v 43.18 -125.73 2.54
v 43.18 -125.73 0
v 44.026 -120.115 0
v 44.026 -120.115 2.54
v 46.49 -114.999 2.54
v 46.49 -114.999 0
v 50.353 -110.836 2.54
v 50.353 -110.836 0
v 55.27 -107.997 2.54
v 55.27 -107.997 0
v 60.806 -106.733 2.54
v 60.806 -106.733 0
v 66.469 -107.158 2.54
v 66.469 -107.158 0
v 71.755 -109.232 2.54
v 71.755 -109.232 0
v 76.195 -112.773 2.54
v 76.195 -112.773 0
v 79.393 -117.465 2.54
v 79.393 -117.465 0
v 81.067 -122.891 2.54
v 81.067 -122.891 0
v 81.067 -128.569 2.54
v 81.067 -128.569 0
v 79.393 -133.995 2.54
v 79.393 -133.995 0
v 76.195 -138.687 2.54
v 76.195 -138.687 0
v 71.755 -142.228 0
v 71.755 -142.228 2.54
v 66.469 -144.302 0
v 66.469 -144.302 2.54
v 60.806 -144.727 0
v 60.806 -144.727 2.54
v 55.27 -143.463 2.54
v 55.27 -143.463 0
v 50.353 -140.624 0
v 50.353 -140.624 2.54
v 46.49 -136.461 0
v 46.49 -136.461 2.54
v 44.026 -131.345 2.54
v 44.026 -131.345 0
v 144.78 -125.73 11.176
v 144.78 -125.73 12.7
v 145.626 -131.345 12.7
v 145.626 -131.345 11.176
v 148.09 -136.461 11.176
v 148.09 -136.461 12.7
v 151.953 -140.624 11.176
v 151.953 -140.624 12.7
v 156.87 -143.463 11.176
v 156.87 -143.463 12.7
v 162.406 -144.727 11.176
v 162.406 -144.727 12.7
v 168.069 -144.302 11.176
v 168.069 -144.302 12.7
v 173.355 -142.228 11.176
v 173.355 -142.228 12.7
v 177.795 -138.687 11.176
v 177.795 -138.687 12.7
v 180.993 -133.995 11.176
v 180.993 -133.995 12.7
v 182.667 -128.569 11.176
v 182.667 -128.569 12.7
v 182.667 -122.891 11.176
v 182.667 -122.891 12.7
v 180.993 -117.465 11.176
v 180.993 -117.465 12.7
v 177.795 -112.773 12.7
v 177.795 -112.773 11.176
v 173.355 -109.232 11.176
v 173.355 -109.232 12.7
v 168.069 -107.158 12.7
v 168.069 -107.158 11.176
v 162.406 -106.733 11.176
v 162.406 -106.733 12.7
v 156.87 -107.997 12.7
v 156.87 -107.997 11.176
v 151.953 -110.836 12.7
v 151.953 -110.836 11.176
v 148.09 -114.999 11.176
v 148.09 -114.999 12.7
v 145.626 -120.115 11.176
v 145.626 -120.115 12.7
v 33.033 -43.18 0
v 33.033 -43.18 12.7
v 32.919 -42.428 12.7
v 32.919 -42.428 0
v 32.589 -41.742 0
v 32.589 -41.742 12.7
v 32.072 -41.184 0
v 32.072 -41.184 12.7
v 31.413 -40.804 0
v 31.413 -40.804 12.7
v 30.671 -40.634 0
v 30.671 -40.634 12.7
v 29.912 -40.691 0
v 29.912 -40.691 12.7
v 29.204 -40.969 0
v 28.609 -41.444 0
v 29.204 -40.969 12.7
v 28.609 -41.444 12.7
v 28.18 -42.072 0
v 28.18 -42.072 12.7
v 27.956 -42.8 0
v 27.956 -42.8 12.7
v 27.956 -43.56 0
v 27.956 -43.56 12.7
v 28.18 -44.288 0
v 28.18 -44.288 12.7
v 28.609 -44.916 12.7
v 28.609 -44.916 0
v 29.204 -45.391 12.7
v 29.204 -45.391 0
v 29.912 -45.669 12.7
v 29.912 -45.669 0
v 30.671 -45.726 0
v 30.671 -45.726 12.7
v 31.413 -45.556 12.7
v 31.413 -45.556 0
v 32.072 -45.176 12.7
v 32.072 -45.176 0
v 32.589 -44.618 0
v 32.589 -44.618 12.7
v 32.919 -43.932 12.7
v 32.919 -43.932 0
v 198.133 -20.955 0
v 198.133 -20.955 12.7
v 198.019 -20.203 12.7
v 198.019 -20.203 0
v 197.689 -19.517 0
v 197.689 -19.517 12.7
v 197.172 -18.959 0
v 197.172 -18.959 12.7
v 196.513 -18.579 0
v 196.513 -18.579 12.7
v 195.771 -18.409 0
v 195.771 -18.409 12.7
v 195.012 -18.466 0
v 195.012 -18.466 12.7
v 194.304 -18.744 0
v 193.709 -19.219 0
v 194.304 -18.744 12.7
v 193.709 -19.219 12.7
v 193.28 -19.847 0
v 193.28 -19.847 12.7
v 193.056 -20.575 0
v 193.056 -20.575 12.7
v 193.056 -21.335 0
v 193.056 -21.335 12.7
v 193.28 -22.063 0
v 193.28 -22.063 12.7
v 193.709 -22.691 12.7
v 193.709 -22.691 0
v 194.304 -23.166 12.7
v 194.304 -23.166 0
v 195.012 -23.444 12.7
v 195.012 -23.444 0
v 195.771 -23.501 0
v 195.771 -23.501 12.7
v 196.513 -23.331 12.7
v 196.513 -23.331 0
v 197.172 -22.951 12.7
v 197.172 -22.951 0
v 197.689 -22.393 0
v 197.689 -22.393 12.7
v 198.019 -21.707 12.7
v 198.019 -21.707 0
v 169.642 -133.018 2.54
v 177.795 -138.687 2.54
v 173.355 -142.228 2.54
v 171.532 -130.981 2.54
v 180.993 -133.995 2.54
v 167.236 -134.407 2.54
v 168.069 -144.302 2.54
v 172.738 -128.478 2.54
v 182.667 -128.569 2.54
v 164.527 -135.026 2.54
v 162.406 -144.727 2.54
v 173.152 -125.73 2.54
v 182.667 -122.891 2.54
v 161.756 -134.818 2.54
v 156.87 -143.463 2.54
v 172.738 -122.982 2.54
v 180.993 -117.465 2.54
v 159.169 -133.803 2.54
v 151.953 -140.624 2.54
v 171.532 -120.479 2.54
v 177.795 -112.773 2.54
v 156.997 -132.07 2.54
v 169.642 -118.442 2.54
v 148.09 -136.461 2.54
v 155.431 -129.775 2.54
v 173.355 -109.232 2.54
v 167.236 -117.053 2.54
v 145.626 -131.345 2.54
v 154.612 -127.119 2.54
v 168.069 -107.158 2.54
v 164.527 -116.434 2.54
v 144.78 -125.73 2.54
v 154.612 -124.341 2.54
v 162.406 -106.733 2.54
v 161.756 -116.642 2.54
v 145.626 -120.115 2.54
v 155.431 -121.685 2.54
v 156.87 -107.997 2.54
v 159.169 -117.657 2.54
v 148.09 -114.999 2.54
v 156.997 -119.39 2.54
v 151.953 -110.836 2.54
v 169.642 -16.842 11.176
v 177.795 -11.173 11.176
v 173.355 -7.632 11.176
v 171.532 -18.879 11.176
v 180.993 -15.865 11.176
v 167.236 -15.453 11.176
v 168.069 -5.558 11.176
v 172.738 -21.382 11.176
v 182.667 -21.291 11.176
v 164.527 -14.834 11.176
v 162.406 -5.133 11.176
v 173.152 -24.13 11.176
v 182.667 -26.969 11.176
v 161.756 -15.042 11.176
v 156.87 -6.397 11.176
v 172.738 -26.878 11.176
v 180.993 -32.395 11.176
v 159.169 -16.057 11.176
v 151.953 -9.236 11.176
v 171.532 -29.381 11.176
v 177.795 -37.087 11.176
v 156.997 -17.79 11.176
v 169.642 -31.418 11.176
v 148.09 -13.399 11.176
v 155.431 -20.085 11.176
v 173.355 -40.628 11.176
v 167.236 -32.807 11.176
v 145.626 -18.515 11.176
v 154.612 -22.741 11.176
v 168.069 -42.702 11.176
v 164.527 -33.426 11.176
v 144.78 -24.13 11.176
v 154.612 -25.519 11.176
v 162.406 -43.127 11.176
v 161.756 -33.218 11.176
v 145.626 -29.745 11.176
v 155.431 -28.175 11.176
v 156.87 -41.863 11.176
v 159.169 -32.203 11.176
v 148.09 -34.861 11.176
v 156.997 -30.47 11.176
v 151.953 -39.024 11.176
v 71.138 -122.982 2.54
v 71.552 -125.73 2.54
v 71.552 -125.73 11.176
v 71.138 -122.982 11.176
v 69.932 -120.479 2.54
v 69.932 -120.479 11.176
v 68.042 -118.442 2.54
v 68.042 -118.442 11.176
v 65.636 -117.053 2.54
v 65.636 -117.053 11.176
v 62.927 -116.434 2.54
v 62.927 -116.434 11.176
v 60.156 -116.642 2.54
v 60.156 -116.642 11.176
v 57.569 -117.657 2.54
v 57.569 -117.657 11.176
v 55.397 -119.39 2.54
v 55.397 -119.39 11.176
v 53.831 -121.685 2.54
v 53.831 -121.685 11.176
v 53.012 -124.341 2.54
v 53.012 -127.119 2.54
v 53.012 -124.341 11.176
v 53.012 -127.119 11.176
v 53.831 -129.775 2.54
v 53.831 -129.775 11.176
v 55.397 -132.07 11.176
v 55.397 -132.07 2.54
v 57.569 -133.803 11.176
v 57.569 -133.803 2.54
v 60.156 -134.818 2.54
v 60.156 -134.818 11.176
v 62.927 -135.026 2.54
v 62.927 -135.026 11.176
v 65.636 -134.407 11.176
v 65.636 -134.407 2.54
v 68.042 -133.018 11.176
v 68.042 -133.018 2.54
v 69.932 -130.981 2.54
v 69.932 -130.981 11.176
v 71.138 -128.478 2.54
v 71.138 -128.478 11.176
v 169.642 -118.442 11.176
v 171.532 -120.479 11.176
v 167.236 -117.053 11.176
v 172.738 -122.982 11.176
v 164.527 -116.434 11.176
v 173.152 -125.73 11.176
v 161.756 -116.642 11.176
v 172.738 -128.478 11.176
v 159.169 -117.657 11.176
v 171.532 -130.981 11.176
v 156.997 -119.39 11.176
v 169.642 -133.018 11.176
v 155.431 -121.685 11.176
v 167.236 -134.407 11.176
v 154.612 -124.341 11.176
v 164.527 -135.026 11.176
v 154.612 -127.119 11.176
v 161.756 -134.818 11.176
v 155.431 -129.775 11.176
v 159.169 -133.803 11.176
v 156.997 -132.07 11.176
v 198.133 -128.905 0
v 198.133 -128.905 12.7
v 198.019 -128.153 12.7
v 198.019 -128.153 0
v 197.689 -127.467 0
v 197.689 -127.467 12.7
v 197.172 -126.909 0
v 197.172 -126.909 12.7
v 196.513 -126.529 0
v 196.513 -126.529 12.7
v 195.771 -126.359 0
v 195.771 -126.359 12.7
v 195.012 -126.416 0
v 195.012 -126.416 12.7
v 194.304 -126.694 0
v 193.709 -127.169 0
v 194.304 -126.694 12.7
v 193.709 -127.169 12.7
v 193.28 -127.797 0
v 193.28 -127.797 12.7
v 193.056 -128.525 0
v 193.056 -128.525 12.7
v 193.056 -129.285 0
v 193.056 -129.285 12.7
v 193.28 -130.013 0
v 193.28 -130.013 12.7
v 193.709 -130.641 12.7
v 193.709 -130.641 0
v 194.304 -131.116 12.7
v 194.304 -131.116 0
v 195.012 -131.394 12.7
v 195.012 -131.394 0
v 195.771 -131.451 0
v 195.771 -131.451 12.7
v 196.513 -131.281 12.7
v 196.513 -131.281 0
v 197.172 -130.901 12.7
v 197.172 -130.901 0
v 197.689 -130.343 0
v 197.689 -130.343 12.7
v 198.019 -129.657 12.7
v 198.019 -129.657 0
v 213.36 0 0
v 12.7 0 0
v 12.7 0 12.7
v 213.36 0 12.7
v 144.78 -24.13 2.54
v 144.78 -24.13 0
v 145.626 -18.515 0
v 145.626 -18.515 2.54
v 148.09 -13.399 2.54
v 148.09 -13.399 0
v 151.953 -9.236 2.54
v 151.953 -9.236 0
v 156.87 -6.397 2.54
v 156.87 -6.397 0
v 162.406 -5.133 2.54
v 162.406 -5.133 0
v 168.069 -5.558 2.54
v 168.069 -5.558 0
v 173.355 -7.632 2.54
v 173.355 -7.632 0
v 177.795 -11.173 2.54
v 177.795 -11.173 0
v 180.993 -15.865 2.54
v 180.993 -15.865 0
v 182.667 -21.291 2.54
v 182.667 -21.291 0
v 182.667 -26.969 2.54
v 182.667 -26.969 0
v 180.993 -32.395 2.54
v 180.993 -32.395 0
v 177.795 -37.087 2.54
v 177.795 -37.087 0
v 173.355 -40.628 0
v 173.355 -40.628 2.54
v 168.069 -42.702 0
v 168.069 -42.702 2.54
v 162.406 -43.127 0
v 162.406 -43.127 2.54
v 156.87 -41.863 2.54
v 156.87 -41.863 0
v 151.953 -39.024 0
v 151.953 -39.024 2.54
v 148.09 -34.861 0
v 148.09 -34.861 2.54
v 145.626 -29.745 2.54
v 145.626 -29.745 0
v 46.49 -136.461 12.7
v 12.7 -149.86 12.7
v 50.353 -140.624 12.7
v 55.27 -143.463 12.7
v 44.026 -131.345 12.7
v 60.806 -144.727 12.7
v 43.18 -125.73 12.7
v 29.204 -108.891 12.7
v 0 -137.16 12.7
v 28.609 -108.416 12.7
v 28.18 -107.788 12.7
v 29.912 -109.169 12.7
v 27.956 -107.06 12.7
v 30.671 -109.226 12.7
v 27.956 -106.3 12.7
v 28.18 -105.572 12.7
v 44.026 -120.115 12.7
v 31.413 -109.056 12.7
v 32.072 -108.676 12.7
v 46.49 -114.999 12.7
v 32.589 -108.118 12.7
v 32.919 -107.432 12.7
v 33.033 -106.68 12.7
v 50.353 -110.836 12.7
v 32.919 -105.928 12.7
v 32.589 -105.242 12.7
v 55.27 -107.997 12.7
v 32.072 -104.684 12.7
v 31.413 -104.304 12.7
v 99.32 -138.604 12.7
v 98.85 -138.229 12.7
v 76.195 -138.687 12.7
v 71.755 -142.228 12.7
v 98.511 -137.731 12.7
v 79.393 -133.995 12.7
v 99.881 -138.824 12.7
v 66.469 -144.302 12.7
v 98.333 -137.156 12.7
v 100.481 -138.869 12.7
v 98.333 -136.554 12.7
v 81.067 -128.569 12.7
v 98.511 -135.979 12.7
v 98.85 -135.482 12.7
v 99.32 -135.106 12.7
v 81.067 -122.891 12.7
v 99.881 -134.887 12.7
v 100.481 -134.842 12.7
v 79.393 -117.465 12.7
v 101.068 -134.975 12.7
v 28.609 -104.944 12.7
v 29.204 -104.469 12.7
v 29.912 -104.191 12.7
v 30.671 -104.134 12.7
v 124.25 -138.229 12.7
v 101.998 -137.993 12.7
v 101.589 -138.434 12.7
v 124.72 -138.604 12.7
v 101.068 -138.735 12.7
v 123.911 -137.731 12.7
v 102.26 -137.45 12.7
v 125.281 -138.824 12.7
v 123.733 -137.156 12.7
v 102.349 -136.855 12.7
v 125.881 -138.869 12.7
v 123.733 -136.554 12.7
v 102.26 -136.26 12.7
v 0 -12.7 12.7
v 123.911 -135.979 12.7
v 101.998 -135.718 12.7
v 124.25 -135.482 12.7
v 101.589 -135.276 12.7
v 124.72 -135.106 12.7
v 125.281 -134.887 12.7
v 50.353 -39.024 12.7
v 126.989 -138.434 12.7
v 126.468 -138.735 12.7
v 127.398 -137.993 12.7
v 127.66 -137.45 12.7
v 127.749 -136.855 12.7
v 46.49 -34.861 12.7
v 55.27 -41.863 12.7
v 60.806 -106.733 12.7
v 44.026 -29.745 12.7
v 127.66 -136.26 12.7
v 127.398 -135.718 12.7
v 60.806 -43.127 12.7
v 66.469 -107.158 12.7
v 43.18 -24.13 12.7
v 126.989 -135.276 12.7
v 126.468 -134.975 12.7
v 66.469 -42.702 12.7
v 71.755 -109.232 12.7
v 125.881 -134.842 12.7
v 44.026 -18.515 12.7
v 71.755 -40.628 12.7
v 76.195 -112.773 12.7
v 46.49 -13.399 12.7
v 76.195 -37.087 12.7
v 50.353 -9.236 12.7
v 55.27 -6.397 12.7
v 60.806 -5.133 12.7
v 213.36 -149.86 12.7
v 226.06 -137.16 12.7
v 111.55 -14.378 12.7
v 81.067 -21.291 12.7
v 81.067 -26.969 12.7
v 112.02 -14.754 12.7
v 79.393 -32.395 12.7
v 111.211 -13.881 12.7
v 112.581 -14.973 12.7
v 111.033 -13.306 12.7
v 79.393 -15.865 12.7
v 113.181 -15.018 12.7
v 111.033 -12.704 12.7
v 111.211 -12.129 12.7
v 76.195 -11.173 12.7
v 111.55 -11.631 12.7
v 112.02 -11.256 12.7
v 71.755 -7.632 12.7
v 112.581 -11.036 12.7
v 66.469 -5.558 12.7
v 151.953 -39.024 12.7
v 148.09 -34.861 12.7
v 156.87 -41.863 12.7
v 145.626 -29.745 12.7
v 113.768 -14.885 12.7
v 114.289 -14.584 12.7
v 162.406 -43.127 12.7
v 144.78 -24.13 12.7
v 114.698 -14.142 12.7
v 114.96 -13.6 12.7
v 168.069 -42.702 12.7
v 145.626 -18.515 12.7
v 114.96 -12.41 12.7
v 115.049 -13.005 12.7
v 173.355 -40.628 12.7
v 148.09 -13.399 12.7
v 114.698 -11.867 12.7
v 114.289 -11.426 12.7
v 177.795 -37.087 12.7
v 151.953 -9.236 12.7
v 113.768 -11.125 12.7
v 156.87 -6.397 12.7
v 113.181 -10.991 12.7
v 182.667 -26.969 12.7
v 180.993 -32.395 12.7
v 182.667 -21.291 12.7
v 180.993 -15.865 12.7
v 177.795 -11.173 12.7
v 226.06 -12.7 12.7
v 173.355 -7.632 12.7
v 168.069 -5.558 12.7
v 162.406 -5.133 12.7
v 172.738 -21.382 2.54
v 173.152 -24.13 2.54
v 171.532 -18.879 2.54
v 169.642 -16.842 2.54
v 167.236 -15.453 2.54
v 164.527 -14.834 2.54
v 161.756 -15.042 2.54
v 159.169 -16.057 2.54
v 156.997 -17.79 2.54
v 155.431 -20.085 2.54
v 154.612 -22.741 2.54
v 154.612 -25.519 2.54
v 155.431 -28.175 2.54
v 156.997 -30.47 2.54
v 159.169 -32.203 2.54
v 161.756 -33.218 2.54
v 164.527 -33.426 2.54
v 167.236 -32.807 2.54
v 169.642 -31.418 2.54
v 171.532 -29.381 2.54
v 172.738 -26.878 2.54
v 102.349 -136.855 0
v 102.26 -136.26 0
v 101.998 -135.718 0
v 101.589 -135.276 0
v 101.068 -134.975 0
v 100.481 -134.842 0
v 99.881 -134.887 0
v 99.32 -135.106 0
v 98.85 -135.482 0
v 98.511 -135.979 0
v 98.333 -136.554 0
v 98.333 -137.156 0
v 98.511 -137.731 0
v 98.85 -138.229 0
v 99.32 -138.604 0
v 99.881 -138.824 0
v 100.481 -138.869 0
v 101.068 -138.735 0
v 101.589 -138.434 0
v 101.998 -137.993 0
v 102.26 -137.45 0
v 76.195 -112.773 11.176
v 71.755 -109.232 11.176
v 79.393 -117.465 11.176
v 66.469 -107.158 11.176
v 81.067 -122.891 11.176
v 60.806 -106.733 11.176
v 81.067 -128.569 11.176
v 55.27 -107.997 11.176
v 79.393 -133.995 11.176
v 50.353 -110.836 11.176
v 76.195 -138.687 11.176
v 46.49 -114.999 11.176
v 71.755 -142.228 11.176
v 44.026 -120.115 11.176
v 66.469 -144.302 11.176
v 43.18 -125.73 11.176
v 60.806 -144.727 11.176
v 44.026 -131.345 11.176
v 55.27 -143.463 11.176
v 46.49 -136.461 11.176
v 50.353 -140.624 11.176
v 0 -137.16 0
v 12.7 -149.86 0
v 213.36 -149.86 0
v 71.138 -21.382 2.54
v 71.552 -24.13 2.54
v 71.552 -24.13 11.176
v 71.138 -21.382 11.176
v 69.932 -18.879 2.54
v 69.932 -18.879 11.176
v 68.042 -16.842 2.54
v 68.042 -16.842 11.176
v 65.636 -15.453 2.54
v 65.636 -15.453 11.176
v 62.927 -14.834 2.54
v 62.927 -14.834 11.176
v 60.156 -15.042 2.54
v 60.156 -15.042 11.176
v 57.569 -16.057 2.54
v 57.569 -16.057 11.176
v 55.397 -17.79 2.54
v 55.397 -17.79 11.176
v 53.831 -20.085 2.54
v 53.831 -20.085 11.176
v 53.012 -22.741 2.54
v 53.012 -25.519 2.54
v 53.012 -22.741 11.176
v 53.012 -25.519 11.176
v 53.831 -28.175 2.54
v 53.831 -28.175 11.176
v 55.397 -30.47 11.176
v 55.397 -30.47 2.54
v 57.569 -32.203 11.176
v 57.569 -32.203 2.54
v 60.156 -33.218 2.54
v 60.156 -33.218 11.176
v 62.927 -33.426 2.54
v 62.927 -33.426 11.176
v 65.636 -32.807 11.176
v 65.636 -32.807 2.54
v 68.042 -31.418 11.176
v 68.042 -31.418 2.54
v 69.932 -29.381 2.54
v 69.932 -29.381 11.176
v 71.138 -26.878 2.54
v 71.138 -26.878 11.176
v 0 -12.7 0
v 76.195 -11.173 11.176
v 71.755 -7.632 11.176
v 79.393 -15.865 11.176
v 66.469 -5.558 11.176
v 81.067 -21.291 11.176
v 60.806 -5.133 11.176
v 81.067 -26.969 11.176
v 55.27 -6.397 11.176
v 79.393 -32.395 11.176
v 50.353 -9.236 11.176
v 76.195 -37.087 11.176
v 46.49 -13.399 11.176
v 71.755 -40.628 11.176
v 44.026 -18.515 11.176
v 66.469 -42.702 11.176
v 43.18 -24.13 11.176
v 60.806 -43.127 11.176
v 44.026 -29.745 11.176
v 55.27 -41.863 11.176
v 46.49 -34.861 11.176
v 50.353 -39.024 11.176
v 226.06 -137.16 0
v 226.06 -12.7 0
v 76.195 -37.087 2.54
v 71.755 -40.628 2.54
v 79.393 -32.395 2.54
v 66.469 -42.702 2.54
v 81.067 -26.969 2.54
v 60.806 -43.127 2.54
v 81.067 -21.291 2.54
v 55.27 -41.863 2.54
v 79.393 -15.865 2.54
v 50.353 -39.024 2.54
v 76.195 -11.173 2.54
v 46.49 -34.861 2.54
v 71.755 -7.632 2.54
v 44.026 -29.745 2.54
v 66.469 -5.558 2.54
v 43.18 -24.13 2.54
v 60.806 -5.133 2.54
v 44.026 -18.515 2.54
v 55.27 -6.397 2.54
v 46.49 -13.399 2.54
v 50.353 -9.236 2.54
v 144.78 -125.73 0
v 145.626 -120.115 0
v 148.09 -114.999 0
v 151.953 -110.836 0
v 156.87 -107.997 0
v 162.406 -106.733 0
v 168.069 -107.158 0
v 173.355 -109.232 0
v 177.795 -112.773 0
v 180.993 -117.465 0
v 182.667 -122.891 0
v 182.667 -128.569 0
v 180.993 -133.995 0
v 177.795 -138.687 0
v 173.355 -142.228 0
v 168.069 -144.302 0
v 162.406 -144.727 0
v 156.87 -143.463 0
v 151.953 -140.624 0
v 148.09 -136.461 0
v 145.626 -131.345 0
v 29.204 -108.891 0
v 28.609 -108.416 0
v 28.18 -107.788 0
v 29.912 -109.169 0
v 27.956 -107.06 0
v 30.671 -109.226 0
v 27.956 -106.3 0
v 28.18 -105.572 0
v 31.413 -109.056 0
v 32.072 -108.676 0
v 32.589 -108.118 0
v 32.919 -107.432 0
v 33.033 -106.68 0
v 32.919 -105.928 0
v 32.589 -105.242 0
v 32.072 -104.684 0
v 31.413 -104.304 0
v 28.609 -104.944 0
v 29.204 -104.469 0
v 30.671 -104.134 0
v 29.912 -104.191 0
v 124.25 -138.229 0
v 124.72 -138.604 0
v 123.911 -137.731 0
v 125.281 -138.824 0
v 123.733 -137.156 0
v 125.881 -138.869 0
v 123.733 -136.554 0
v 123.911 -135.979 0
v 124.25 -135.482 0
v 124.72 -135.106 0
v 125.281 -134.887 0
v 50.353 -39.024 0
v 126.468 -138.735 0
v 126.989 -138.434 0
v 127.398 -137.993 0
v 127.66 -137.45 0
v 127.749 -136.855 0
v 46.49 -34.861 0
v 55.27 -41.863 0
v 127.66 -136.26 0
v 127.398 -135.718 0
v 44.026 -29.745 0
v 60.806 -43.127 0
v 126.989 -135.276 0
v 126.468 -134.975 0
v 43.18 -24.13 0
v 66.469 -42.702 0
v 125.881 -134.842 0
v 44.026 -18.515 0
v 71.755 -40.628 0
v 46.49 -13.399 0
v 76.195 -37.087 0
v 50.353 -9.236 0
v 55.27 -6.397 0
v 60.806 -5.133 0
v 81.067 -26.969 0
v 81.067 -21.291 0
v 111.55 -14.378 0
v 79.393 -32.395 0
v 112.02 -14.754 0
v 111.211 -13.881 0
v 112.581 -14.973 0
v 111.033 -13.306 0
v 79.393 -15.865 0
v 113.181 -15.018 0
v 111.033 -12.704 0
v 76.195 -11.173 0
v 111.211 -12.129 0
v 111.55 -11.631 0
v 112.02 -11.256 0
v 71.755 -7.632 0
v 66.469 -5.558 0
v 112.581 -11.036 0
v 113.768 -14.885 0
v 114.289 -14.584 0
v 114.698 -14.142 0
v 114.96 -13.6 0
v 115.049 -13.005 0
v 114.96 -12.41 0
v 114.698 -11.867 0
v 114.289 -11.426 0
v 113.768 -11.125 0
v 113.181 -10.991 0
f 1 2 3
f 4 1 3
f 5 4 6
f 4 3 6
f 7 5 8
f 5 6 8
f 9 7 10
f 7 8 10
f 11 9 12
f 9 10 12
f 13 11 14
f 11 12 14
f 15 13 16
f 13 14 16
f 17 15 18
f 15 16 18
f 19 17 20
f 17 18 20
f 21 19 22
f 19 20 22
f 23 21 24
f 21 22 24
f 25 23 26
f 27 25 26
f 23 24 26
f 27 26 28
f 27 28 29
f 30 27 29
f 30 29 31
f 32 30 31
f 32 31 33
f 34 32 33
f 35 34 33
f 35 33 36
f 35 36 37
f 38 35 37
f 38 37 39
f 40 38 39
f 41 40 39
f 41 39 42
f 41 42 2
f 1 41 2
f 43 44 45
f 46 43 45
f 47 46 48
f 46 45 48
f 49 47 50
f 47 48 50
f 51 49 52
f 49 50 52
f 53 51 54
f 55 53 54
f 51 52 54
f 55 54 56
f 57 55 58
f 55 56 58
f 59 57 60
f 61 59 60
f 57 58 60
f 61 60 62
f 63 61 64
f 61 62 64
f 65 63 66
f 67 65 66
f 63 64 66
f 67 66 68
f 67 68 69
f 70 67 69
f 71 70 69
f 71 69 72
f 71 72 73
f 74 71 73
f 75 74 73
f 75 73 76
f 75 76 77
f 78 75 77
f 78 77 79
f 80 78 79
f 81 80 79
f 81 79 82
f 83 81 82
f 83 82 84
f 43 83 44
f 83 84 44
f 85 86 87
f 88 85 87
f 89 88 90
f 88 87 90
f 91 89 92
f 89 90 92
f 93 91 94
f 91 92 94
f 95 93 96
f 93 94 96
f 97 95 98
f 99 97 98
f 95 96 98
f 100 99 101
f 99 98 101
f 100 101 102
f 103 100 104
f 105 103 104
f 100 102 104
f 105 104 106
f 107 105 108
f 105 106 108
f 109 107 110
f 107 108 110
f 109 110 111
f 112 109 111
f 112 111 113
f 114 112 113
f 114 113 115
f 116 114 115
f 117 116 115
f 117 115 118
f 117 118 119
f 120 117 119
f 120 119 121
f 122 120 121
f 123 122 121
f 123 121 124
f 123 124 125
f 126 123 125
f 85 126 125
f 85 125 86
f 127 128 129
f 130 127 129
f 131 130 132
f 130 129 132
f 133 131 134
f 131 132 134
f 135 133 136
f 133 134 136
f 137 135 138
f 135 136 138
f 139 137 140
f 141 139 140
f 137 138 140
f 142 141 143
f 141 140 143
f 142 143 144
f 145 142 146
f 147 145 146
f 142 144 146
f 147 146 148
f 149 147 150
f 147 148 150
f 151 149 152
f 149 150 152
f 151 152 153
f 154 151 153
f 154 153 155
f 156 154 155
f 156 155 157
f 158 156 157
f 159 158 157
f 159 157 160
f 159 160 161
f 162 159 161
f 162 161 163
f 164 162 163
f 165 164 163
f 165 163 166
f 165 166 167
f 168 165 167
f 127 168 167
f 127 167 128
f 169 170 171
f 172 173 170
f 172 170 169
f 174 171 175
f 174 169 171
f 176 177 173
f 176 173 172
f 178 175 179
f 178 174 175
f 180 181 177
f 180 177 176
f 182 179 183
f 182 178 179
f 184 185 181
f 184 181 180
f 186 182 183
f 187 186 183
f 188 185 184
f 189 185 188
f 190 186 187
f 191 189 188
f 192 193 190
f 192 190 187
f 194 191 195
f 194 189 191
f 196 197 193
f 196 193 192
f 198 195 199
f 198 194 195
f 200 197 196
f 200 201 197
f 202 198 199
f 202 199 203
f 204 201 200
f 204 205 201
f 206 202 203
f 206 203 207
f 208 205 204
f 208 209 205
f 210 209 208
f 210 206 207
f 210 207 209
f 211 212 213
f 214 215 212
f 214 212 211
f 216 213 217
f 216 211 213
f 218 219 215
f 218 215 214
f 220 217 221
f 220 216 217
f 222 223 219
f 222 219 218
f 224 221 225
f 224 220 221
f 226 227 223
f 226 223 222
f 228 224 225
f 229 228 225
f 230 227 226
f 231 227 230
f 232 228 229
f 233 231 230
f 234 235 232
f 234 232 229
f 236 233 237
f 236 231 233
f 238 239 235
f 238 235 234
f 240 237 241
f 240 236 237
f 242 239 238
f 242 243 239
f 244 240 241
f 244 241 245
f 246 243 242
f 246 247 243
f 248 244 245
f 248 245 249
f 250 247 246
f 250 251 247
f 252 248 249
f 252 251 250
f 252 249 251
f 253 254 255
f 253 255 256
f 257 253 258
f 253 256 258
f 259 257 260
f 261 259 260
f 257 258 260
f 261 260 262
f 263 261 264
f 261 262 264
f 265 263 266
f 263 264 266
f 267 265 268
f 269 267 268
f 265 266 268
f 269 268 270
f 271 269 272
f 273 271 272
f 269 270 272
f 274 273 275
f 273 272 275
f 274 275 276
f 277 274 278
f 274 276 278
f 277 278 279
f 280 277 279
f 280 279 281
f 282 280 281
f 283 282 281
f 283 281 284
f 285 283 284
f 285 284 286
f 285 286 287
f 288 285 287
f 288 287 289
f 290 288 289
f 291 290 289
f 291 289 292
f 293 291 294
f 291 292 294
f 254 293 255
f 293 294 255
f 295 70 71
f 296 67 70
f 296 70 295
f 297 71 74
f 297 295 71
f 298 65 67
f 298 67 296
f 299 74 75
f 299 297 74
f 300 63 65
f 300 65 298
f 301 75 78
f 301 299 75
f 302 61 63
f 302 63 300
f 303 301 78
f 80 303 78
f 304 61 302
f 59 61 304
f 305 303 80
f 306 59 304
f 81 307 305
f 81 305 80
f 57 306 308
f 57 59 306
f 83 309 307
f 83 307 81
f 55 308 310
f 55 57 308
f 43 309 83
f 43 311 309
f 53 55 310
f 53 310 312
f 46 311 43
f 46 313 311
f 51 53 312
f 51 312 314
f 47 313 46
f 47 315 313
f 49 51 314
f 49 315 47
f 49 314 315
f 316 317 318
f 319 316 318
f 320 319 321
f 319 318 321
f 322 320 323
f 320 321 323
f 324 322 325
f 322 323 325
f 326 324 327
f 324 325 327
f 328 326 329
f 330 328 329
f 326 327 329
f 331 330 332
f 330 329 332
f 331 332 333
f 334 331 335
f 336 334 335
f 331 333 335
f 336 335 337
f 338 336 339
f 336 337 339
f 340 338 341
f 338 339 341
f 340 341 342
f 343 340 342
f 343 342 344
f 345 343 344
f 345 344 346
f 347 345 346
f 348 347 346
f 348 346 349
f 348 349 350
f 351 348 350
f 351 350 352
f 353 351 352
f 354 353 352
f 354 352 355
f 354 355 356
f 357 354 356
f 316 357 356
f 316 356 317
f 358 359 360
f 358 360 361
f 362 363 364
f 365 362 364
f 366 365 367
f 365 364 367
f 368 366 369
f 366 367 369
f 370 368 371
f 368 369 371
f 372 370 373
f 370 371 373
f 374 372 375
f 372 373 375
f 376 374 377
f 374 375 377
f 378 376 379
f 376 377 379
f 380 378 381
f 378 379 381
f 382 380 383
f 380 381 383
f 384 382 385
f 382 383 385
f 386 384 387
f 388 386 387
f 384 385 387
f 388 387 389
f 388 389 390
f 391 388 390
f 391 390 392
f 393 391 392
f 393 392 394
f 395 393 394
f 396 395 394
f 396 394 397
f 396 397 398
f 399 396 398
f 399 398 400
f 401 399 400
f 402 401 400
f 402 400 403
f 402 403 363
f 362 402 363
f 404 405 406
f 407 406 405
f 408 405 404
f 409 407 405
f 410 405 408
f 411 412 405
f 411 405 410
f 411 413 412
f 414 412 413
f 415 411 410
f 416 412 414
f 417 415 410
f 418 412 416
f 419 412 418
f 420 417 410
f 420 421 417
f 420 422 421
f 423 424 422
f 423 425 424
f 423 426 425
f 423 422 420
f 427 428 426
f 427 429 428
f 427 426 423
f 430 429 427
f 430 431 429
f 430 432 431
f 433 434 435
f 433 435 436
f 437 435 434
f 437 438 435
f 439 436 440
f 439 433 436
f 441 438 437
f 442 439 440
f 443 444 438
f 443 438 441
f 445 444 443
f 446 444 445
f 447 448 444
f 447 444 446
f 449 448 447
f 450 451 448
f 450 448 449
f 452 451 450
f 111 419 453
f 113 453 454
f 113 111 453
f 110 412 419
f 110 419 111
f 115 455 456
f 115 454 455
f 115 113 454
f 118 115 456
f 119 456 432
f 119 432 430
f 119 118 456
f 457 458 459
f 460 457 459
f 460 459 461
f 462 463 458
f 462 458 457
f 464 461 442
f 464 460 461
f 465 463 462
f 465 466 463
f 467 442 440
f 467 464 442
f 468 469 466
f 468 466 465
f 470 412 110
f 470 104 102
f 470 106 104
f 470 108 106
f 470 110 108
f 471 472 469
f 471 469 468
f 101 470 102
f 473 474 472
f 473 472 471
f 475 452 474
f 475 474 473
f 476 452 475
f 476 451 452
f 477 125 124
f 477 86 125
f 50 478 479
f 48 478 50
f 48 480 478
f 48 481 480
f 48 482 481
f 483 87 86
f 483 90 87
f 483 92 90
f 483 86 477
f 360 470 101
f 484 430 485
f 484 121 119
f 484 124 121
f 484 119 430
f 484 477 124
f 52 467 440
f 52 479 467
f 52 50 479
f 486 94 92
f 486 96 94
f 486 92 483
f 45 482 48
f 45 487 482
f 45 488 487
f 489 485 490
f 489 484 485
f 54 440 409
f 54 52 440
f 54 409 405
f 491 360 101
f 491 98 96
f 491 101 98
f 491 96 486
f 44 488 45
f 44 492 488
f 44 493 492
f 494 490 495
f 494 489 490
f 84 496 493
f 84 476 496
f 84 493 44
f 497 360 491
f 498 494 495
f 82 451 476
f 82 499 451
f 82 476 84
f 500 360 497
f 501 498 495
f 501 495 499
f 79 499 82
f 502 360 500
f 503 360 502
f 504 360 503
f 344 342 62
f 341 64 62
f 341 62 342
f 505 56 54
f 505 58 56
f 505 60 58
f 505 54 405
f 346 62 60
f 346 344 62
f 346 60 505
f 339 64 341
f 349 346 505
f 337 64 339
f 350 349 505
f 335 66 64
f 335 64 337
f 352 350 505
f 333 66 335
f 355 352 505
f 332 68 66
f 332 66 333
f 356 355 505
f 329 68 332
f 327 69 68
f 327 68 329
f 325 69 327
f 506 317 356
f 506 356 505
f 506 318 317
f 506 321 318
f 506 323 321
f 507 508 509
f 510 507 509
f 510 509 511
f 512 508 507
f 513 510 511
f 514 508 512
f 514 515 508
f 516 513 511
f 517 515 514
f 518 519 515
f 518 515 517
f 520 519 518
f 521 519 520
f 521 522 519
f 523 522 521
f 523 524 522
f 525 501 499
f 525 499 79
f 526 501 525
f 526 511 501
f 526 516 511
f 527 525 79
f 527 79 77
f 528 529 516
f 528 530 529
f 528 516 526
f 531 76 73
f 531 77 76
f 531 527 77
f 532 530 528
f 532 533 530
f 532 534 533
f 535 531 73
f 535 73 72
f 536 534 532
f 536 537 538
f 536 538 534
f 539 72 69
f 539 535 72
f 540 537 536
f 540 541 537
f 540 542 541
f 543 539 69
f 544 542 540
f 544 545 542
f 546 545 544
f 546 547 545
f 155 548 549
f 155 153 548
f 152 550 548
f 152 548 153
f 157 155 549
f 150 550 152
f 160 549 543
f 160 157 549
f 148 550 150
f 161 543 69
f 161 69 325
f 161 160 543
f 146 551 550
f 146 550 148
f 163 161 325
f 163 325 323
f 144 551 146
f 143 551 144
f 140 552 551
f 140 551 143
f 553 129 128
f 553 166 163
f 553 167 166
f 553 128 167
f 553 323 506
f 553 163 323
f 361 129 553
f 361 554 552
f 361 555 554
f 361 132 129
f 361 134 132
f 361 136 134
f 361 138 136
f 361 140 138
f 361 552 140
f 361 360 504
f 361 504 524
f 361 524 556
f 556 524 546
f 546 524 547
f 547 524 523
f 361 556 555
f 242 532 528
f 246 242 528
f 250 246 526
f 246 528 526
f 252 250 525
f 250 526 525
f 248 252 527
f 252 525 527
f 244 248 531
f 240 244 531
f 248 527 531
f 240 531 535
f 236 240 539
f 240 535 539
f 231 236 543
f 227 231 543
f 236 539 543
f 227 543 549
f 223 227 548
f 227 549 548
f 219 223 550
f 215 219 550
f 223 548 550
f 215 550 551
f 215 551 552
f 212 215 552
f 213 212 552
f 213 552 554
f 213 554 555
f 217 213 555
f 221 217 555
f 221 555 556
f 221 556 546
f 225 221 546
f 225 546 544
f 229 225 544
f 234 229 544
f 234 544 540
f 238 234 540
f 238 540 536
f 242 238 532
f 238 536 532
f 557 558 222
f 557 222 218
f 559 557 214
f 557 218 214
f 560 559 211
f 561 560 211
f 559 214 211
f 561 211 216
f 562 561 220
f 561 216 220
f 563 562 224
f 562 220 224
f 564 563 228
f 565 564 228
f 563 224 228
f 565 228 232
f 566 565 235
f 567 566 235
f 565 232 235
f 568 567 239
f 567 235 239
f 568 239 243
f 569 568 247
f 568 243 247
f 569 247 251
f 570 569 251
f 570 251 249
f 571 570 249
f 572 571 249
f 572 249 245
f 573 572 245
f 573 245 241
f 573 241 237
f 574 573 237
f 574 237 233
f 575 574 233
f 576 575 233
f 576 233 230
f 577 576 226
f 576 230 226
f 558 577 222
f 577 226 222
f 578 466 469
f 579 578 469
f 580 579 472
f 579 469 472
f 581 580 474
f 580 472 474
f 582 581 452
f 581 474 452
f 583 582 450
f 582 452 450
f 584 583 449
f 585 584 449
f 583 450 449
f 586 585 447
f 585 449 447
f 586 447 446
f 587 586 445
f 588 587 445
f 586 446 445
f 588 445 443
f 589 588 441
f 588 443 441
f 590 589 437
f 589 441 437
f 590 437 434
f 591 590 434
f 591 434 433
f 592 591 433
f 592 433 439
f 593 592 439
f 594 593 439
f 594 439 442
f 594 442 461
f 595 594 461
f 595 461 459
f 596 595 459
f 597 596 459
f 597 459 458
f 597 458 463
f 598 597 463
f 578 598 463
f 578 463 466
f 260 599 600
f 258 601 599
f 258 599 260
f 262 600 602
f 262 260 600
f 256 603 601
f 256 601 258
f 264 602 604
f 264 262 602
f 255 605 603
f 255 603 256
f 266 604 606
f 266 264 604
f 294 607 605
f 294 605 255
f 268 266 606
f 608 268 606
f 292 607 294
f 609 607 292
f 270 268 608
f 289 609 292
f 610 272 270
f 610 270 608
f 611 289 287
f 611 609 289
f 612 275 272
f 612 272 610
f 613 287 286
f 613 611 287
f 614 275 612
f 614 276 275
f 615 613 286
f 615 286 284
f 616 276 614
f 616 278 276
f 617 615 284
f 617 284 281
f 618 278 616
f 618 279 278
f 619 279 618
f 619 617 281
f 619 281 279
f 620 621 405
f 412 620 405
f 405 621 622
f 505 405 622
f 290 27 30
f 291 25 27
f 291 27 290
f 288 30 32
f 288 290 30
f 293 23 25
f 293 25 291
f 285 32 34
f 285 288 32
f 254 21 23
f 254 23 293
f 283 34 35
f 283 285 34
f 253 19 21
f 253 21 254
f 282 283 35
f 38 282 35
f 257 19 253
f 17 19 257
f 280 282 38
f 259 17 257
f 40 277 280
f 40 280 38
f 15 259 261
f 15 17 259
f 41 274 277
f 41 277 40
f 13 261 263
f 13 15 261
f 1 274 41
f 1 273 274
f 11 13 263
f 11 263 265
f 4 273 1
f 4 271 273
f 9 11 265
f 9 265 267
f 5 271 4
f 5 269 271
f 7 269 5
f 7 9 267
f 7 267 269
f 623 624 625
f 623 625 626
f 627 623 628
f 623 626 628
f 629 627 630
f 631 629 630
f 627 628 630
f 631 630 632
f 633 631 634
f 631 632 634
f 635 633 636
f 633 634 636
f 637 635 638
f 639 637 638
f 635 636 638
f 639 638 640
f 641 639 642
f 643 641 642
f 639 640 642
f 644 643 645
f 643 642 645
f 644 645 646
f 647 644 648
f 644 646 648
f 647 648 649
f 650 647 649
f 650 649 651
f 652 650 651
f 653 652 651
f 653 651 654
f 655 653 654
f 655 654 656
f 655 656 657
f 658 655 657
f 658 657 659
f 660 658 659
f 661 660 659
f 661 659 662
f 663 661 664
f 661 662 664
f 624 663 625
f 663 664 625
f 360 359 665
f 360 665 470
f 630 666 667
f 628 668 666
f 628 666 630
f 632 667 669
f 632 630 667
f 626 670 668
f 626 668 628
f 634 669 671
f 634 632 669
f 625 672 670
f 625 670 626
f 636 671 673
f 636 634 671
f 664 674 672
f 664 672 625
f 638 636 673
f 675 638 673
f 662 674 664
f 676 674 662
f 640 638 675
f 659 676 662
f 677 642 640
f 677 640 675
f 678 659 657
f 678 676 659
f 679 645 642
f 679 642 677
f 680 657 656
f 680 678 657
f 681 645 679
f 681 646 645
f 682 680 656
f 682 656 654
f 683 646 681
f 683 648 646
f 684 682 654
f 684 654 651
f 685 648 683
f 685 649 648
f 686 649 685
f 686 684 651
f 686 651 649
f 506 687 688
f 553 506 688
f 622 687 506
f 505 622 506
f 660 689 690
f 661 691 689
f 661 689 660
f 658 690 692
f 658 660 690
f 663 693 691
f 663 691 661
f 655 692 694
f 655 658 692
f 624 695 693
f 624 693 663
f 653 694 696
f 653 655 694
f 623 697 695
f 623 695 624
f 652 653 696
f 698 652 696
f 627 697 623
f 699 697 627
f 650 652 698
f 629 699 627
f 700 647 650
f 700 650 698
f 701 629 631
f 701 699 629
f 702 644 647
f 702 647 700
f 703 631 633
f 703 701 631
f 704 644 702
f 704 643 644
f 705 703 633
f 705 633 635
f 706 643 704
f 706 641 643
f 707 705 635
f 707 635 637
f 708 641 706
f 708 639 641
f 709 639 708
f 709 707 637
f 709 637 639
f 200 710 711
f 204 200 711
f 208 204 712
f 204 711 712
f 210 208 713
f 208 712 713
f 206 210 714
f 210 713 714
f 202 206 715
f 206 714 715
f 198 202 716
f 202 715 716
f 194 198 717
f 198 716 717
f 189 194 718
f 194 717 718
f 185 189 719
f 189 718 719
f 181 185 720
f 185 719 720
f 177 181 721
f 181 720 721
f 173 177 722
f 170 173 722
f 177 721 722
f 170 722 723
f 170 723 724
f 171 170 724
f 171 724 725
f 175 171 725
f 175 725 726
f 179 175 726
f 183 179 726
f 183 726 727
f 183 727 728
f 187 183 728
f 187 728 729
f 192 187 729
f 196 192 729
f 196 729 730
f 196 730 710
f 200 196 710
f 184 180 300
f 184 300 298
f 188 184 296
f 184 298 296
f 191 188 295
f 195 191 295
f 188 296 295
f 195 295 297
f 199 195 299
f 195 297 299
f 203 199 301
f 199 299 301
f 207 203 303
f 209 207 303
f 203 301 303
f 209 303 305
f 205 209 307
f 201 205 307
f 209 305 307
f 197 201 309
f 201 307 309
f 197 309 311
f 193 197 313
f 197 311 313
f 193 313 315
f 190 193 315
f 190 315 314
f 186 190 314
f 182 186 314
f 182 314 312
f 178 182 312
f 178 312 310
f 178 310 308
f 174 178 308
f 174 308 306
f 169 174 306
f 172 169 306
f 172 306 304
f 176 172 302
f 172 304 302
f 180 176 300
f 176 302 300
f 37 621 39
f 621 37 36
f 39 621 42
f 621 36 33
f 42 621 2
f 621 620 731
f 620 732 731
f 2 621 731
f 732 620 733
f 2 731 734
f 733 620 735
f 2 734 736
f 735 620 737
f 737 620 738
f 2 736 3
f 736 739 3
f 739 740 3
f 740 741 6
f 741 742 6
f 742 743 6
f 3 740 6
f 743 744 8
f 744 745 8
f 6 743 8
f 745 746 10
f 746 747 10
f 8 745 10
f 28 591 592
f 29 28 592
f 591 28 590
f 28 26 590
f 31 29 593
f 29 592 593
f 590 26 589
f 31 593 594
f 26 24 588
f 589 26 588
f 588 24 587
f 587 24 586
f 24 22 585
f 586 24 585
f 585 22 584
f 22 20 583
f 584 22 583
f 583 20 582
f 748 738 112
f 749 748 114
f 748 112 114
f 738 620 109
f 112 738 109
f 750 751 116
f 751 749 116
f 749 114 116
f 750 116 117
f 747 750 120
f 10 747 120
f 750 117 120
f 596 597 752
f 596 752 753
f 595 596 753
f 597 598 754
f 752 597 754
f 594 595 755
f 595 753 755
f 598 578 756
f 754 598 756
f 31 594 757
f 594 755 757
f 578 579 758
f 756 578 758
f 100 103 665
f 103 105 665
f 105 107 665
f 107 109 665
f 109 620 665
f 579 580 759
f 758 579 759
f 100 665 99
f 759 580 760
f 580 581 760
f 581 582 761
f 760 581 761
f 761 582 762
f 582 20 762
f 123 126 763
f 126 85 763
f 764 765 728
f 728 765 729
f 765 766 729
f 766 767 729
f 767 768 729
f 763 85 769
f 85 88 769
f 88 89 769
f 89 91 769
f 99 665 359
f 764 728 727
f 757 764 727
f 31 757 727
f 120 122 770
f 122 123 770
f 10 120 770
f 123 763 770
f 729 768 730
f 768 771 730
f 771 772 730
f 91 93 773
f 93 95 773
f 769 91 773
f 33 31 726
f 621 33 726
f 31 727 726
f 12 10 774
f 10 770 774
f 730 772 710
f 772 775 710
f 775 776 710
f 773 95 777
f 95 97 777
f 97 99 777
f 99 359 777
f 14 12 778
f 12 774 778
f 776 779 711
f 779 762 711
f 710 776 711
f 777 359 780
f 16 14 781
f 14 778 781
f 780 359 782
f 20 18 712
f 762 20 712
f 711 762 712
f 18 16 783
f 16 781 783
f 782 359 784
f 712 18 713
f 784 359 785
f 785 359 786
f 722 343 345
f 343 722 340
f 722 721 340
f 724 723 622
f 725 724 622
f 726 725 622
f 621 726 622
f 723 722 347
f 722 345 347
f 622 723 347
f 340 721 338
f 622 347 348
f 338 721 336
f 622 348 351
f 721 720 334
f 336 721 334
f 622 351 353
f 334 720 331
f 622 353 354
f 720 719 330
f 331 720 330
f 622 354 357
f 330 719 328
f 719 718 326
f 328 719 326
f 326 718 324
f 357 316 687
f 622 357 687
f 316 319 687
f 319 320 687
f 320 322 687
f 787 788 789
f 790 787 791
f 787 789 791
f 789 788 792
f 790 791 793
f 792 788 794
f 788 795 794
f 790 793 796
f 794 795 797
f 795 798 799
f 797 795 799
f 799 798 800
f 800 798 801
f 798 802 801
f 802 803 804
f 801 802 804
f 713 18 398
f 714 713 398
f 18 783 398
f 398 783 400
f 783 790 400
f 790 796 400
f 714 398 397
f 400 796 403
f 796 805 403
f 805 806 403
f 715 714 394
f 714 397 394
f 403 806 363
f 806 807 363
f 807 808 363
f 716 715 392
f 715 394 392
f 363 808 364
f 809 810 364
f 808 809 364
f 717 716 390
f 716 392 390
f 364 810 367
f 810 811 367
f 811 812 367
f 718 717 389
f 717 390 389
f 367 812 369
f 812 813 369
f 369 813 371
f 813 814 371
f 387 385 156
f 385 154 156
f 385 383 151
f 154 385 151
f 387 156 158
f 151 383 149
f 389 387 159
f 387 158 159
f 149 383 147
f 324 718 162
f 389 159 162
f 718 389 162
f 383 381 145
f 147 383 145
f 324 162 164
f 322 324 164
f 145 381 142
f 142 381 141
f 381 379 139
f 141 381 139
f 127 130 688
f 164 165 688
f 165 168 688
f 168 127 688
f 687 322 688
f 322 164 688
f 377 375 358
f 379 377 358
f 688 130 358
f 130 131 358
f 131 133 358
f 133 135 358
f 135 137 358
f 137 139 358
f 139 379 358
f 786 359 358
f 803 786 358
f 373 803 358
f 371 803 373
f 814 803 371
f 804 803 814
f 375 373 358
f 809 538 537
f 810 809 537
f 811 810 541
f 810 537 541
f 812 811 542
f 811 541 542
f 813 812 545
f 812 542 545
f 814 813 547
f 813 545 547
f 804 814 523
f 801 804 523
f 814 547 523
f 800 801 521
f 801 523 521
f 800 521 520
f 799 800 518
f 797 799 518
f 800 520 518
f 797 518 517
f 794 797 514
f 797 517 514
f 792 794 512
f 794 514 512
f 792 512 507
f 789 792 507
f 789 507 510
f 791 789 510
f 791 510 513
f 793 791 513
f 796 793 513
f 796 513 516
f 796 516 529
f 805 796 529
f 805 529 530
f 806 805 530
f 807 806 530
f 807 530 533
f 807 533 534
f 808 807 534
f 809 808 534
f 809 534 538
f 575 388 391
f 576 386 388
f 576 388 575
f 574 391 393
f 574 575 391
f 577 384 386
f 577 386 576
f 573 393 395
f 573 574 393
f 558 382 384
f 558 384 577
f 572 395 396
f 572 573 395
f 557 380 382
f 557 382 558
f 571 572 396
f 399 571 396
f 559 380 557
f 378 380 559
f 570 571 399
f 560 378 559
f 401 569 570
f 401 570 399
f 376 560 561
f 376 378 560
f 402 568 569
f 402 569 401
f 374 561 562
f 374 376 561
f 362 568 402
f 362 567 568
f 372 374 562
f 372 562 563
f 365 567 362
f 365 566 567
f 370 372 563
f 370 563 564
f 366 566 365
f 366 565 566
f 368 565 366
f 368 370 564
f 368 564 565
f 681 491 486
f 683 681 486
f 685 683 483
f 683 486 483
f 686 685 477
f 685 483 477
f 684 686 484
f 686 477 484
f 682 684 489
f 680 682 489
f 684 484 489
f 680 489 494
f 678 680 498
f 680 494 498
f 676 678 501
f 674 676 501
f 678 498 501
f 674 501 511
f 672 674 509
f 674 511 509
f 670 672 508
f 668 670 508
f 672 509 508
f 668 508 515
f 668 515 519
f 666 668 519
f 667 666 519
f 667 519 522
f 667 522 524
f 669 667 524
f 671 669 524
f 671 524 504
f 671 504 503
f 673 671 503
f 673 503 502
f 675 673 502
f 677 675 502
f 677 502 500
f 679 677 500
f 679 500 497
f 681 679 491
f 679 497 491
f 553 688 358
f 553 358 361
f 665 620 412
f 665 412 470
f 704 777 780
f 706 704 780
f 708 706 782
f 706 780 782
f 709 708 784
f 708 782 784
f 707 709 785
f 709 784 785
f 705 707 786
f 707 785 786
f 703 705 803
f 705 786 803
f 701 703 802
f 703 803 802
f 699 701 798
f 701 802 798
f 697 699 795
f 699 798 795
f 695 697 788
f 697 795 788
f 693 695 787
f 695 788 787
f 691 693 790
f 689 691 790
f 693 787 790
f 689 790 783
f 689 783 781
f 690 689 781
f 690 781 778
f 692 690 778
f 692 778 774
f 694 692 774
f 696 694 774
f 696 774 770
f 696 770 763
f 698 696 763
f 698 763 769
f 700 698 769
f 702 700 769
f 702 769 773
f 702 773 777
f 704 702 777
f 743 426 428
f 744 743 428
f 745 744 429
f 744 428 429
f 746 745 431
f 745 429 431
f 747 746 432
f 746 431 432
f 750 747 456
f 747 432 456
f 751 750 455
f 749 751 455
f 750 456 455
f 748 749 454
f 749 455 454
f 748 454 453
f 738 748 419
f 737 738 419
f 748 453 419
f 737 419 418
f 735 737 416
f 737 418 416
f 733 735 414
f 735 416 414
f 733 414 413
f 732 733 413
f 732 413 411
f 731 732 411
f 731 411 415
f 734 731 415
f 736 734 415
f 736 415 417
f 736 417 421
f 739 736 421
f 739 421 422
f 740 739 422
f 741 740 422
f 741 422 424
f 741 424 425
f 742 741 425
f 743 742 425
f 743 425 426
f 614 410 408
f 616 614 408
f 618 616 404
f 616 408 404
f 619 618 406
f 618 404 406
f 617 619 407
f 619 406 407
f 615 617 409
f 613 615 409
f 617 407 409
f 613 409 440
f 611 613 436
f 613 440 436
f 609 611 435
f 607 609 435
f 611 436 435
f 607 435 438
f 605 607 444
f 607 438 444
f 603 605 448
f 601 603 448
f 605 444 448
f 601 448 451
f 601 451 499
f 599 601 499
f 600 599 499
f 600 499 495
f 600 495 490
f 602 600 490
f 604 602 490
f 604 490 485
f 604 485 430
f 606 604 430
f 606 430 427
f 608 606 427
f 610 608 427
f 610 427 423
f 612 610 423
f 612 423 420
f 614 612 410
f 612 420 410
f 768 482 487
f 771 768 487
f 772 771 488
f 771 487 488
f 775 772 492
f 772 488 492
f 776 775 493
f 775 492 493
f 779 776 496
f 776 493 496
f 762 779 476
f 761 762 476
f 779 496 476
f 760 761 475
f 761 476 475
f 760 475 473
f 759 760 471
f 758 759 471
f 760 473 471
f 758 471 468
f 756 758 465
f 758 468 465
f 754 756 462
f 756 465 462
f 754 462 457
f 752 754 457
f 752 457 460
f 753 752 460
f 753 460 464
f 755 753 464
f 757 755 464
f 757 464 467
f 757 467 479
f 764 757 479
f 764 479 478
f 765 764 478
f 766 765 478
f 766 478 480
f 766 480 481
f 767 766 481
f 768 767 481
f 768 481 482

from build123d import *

# Parameters (mm, degrees)
SKETCH3_W                                        = 226.06
SKETCH3_H                                        = 149.86
EXTRUDE2_DEPTH                                   = 12.7
F_1_4_20_TAPPED_HOLE1_D                          = 5.1054
CBORE_FOR_5_8_SOCKET_HEAD_CAP_SCREW1_D           = 18.6436
CBORE_FOR_5_8_SOCKET_HEAD_CAP_SCREW1_CBORE_D     = 38.1
CBORE_FOR_5_8_SOCKET_HEAD_CAP_SCREW1_CBORE_DEPTH = 2.54
F_10_32_TAPPED_HOLE1_D                           = 4.0386
CHAMFER1_SIZE                                    = 12.7
SKETCH20_R                                       = 19.05
CUT_EXTRUDE5_DEPTH                               = 1.524


with BuildPart() as part:
    # Sketch3 → Extrude2 (new body)
    with BuildSketch(Plane.XY):
        with Locations((113.03, -74.93)):
            Rectangle(SKETCH3_W, SKETCH3_H)
    extrude(amount=EXTRUDE2_DEPTH)

    # 1/4-20 Tapped Hole1 (through all)
    with Locations(Plane(origin=(0, 0, 0), x_dir=(-1, 0, 0), z_dir=(0, 0, -1))):
        with Locations((-195.58, -20.955), (-195.58, -128.905), (-30.48, -43.18), (-30.48, -106.68)):
            Hole(F_1_4_20_TAPPED_HOLE1_D / 2)

    # CBORE for 5/8 Socket Head Cap Screw1 (through all)
    with Locations(Plane(origin=(163.83, -24.13, 0), x_dir=(-1, 0, 0), z_dir=(0, 0, -1))):
        with Locations((0, 0), (101.6, 0), (101.6, -101.6), (0, -101.6)):
            CounterBoreHole(CBORE_FOR_5_8_SOCKET_HEAD_CAP_SCREW1_D / 2, CBORE_FOR_5_8_SOCKET_HEAD_CAP_SCREW1_CBORE_D / 2, CBORE_FOR_5_8_SOCKET_HEAD_CAP_SCREW1_CBORE_DEPTH)

    # #10-32 Tapped Hole1 (through all)
    with Locations(Plane(origin=(0, 0, 0), x_dir=(-1, 0, 0), z_dir=(0, 0, -1))):
        with Locations((-113.03, -13.0048), (-125.73, -136.8552), (-100.33, -136.8552)):
            Hole(F_10_32_TAPPED_HOLE1_D / 2)

    # Chamfer1
    chamfer1_edges = [part.edges().sort_by_distance(p)[0] for p in [
        (0, 0, 6.35),
        (226.06, 0, 6.35),
        (226.06, -149.86, 6.35),
        (0, -149.86, 6.35),
    ]]
    chamfer(chamfer1_edges, length=CHAMFER1_SIZE)

    # Sketch20 → Cut-Extrude5 (cut)
    with BuildSketch(Plane.XY.offset(12.7)):
        with Locations(Location((163.83, -125.73, 0), (0, 0, 180))):  # turned: the seam where the file's is
            Circle(SKETCH20_R)
        with Locations(Location((62.23, -125.73, 0), (0, 0, 180))):  # turned: the seam where the file's is
            Circle(SKETCH20_R)
        with Locations(Location((163.83, -24.13, 0), (0, 0, 180))):  # turned: the seam where the file's is
            Circle(SKETCH20_R)
        with Locations(Location((62.23, -24.13, 0), (0, 0, 180))):  # turned: the seam where the file's is
            Circle(SKETCH20_R)
    extrude(amount=-CUT_EXTRUDE5_DEPTH, mode=Mode.SUBTRACT)


solid = part.part
